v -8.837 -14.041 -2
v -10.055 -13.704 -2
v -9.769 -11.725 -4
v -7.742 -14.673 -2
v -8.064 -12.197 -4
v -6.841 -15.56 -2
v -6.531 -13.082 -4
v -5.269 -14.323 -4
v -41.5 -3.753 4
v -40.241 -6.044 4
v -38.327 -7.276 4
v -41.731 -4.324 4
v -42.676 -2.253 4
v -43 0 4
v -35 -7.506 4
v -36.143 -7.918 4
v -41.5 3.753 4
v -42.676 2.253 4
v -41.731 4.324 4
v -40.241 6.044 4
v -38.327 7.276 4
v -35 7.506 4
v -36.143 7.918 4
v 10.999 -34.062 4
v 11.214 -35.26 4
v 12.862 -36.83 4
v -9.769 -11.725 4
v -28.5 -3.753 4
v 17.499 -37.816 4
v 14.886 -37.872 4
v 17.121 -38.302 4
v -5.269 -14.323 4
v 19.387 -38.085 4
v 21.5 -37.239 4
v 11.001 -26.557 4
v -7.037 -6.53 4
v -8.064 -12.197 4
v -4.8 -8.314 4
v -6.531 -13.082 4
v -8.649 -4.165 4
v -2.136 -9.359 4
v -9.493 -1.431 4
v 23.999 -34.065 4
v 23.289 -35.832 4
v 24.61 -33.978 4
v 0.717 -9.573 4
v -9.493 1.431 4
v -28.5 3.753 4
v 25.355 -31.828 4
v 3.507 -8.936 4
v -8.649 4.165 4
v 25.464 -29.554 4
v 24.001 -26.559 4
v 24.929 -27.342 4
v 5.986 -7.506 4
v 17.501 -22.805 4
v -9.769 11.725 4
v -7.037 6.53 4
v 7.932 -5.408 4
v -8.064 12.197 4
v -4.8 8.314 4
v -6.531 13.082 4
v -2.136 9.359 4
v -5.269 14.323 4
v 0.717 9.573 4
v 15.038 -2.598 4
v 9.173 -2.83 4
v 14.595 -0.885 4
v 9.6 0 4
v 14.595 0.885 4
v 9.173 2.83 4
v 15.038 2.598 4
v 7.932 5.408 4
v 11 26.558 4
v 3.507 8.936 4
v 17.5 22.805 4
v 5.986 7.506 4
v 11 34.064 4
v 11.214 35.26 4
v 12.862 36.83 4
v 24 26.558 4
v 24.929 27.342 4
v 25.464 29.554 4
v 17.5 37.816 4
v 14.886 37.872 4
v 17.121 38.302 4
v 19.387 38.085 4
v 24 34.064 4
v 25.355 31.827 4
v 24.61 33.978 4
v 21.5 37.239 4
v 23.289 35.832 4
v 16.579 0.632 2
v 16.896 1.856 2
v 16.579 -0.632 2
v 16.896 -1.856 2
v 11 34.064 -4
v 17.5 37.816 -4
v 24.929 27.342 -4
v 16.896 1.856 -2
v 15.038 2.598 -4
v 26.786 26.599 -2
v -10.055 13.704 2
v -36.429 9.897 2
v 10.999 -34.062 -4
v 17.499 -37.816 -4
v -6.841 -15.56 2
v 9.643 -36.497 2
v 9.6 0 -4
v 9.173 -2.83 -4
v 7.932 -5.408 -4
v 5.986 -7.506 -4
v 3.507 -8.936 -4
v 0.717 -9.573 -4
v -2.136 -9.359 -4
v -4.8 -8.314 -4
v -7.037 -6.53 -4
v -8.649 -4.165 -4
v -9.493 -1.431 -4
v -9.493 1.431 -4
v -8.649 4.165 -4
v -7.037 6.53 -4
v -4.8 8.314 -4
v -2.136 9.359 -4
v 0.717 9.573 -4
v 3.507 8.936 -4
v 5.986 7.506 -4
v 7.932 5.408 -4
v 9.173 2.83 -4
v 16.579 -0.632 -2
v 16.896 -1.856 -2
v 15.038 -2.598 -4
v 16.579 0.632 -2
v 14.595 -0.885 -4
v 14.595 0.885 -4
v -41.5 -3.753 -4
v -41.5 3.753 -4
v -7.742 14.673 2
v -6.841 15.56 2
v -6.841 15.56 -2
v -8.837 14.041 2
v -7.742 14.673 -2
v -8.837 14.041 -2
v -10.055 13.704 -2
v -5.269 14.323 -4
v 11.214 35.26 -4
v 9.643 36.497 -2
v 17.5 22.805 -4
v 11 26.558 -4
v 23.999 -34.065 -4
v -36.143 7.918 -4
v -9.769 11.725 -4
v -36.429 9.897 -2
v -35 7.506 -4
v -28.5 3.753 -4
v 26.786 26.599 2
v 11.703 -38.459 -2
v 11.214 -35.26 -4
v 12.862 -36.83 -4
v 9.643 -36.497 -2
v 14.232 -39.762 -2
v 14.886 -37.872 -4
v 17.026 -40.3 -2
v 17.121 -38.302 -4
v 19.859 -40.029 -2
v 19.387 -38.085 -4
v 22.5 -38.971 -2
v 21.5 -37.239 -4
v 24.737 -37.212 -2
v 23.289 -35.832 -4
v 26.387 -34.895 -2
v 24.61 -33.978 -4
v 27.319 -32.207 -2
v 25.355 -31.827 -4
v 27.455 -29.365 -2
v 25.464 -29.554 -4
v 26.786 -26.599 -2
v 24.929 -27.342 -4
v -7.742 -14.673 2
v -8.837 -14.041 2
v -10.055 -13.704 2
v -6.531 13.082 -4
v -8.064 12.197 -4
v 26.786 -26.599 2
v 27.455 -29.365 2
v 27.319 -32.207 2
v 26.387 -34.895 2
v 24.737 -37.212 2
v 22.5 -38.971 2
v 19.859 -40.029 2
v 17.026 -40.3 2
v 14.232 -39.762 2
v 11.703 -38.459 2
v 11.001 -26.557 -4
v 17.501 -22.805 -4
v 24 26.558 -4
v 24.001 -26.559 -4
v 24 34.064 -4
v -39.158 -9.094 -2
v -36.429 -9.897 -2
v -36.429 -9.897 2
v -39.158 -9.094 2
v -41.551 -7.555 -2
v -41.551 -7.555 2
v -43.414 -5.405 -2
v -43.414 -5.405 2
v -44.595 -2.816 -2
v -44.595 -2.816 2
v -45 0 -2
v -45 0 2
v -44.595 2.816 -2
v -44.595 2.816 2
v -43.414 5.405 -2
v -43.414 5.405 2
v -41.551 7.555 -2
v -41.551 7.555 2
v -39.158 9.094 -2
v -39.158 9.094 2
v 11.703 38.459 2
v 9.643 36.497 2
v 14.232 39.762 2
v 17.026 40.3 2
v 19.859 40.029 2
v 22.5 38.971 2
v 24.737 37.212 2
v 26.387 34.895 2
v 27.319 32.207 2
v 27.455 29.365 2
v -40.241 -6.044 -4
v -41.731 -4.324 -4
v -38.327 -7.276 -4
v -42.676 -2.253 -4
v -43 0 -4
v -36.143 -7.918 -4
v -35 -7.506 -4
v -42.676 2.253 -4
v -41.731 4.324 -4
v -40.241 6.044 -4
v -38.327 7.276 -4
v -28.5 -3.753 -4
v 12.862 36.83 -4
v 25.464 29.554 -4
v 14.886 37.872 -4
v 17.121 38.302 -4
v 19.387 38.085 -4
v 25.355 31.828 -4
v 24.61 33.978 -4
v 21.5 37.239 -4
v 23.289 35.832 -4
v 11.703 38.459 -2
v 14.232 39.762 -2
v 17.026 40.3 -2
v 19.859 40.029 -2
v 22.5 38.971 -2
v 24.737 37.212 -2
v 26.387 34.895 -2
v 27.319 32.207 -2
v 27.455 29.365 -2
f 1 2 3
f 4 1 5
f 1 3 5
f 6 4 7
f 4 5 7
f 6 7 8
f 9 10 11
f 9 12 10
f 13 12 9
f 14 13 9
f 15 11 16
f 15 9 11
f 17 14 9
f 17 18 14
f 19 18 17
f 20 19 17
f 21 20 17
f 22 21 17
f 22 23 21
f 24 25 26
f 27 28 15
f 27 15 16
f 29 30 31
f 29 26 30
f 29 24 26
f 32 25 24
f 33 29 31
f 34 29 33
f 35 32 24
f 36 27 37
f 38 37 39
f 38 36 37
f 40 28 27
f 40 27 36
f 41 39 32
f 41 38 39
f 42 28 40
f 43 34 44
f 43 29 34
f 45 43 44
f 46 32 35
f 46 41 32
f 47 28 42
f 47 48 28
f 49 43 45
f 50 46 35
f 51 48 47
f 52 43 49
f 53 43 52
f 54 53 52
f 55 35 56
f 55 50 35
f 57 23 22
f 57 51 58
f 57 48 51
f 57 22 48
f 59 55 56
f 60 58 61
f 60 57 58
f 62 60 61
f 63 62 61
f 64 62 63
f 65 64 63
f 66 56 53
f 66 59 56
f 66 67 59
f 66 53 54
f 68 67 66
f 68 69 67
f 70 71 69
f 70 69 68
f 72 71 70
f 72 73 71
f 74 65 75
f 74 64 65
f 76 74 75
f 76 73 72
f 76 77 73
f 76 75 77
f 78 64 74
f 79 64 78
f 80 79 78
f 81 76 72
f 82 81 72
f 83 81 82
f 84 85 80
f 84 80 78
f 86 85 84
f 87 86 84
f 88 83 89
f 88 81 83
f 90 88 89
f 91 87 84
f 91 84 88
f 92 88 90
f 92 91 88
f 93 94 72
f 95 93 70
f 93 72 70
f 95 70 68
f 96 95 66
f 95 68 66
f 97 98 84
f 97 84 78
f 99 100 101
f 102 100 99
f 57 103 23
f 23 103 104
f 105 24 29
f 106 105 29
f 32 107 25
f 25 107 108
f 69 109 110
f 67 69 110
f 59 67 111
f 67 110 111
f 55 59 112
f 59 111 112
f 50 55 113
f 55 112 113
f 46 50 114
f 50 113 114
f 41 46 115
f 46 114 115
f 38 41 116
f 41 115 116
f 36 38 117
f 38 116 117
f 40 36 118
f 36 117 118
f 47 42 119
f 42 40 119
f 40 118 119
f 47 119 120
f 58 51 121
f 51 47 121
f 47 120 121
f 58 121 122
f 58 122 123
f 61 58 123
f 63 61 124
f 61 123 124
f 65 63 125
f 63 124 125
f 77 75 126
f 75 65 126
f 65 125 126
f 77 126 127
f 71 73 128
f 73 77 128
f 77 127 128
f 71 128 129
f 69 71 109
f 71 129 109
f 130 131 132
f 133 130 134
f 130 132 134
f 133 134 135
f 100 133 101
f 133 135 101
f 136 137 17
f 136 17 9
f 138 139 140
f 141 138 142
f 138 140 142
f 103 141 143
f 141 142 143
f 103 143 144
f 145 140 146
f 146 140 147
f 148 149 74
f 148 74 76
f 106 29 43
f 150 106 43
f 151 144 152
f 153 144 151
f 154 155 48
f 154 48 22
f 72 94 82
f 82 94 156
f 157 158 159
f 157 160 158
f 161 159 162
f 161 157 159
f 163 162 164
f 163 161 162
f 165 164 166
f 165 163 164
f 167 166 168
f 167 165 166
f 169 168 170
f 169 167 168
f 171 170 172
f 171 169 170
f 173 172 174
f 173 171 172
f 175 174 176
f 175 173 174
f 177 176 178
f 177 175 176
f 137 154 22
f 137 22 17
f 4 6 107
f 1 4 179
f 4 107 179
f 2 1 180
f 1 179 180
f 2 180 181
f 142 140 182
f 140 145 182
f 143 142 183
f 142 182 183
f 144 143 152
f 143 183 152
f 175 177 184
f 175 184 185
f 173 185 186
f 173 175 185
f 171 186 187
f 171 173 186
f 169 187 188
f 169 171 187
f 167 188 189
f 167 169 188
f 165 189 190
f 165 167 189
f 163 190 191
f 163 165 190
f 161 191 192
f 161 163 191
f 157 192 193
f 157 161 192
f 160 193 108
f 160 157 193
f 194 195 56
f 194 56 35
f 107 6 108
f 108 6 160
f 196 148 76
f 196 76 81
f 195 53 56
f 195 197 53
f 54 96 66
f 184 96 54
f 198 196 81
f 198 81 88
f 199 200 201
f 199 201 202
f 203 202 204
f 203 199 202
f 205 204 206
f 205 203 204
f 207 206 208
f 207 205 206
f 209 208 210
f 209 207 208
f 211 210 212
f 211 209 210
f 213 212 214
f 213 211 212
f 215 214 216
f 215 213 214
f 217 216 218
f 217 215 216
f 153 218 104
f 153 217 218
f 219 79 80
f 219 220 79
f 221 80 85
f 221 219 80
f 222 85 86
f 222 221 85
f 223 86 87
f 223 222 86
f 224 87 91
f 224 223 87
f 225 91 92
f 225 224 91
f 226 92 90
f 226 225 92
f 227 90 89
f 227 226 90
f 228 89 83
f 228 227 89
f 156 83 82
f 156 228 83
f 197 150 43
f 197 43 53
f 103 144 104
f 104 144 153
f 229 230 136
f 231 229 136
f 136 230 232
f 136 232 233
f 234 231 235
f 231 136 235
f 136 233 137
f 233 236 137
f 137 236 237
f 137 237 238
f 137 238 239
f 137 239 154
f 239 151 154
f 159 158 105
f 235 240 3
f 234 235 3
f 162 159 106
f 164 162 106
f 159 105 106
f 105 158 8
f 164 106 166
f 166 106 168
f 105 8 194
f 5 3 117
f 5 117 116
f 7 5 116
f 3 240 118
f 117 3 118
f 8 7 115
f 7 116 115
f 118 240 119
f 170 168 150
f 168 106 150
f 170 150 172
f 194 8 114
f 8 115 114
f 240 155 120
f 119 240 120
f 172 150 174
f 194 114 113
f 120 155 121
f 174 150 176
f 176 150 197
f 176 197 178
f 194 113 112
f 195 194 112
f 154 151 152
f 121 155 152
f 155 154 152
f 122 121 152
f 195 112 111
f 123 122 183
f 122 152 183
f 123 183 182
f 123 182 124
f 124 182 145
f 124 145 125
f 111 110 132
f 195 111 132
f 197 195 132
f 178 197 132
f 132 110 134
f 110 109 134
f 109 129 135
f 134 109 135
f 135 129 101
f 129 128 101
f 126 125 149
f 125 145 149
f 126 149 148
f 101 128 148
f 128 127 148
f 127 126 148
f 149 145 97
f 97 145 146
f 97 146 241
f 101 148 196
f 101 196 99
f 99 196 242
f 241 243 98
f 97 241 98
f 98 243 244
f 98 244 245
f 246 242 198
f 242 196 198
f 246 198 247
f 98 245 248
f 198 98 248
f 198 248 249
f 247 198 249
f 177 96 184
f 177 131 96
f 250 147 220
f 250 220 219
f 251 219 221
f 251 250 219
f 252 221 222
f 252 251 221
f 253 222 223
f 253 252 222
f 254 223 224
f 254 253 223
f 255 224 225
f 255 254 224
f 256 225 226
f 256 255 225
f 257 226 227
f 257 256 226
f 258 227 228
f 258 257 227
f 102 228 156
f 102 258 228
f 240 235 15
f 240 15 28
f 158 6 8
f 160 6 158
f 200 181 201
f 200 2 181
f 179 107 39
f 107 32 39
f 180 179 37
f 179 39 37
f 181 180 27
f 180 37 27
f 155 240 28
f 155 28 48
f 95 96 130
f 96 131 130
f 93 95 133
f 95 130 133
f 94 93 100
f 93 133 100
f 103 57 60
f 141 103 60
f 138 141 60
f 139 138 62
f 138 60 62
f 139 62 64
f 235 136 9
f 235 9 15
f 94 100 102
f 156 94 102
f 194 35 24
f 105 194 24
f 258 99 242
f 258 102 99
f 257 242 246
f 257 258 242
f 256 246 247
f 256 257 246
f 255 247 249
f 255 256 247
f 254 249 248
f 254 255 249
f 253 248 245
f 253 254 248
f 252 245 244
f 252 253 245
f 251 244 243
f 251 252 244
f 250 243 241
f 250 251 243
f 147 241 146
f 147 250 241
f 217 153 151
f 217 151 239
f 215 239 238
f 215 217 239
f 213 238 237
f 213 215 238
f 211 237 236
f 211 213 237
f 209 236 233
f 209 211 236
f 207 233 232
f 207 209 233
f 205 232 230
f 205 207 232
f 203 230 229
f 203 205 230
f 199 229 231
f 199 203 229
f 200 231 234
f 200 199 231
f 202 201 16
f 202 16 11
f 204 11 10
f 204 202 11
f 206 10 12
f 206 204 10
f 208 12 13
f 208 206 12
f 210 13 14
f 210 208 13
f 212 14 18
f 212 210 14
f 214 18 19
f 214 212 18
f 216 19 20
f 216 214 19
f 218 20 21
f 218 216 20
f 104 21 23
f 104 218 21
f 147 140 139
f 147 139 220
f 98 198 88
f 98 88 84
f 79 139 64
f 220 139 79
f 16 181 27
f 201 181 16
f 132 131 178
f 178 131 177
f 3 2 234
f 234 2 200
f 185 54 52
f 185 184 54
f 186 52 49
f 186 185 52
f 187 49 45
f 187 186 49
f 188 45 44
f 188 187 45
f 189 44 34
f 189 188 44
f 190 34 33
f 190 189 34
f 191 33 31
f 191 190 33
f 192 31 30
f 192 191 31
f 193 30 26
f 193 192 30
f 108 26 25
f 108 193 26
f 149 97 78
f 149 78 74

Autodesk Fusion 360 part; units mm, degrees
sketch "Sketch2" plane through (0, 0, 0) normal (0, 0, 1) x (1, 0, 0)
  circle A0 centre (0, 0) radius 45 construction
  line L0 (-28.5, 3.7528) -> (-35, 7.5056)
  line L1 (-35, 7.5056) -> (-41.5, 3.7528)
  line L2 (-41.5, 3.7528) -> (-41.5, -3.7528)
  line L3 (-41.5, -3.7528) -> (-35, -7.5056)
  line L4 (-35, -7.5056) -> (-28.5, -3.7528)
  line L5 (-28.5, -3.7528) -> (-28.5, 3.7528)
  line L6 (11.0007, -26.557) -> (10.9993, -34.0625)
  line L7 (10.9993, -34.0625) -> (17.4987, -37.8164)
  line L8 (17.4987, -37.8164) -> (23.9993, -34.0648)
  line L9 (23.9993, -34.0648) -> (24.0007, -26.5592)
  line L10 (24.0007, -26.5592) -> (17.5013, -22.8053)
  line L11 (17.5013, -22.8053) -> (11.0007, -26.557)
  line L12 (17.5, 22.8053) -> (24, 26.5581)
  line L13 (24, 26.5581) -> (24, 34.0637)
  line L14 (24, 34.0637) -> (17.5, 37.8164)
  line L15 (17.5, 37.8164) -> (11, 34.0637)
  line L16 (11, 34.0637) -> (11, 26.5581)
  line L17 (11, 26.5581) -> (17.5, 22.8053)
  circle A1 centre (0, 0) radius 4
  circle A2 centre (0, 0) radius 6.075
  circle A3 centre (0, 0) radius 9.6
  line L18 (-8.0769, -13.9896) -> (-36.4286, -9.8974)
  line L19 (-8.0769, 13.9896) -> (-36.4286, 9.8974)
  line L20 (16.1538, 0) -> (26.7857, -26.5994)
  line L21 (-8.0769, -13.9896) -> (9.6429, -36.4968)
  line L22 (-8.0769, 13.9896) -> (9.6429, 36.4968)
  line L23 (16.1538, 0) -> (26.7857, 26.5994)
  arc A4 (-36.4286, 9.8974) -> (-36.4286, -9.8974) centre (-35, 0) ccw
  arc A5 (26.7857, 26.5994) -> (9.6429, 36.4968) centre (17.5, 30.3109) ccw
  arc A6 (9.6429, -36.4968) -> (26.7857, -26.5994) centre (17.5, -30.3109) ccw
  point P0 (-35, 0)
  point P1 (17.5, -30.3109)
  point P2 (17.5, 30.3109)
  dimension "d1" = 90
  dimension "d3" = 6.5
  dimension "d4" = 35
  dimension "d7" = 6.5
  dimension "d8" = 6.5
  dimension "d9" = 8
  dimension "d10" = 12.15
  dimension "d11" = 19.2
  dimension "d12" = 35
  dimension "d13" = 35
extrude "Extrude1" add sketch "Sketch2" along normal mid plane 8 contours L18 L19 L20 L21 L22 L23 A4 A5 A6
fillet "Fillet1" radius 5 3 edges at (-8.0769, -13.9896, 0) (16.1538, 0, 0) (-8.0769, 13.9896, 0)
chamfer "Chamfer1" distance 2 angle 45 12 edges at (-8.2692, 14.3227, 4) (-23.2418, 11.8008, 4) (-45, 0, 4) (-23.2418, -11.8008, 4) (-8.2692, -14.3227, 4) (1.4011, -26.0283, 4) (22.5, -38.9711, 4) (21.8407, -14.2276, 4) (16.5385, 0, 4) (21.8407, 14.2276, 4) (22.5, 38.9711, 4) (1.4011, 26.0283, 4)
chamfer "Chamfer2" distance 2 angle 45 12 edges at (21.8407, 14.2276, -4) (16.5385, 0, -4) (21.8407, -14.2276, -4) (22.5, -38.9711, -4) (1.4011, -26.0283, -4) (-8.2692, -14.3227, -4) (-23.2418, -11.8008, -4) (-45, 0, -4) (-23.2418, 11.8008, -4) (-8.2692, 14.3227, -4) (1.4011, 26.0283, -4) (22.5, 38.9711, -4)
